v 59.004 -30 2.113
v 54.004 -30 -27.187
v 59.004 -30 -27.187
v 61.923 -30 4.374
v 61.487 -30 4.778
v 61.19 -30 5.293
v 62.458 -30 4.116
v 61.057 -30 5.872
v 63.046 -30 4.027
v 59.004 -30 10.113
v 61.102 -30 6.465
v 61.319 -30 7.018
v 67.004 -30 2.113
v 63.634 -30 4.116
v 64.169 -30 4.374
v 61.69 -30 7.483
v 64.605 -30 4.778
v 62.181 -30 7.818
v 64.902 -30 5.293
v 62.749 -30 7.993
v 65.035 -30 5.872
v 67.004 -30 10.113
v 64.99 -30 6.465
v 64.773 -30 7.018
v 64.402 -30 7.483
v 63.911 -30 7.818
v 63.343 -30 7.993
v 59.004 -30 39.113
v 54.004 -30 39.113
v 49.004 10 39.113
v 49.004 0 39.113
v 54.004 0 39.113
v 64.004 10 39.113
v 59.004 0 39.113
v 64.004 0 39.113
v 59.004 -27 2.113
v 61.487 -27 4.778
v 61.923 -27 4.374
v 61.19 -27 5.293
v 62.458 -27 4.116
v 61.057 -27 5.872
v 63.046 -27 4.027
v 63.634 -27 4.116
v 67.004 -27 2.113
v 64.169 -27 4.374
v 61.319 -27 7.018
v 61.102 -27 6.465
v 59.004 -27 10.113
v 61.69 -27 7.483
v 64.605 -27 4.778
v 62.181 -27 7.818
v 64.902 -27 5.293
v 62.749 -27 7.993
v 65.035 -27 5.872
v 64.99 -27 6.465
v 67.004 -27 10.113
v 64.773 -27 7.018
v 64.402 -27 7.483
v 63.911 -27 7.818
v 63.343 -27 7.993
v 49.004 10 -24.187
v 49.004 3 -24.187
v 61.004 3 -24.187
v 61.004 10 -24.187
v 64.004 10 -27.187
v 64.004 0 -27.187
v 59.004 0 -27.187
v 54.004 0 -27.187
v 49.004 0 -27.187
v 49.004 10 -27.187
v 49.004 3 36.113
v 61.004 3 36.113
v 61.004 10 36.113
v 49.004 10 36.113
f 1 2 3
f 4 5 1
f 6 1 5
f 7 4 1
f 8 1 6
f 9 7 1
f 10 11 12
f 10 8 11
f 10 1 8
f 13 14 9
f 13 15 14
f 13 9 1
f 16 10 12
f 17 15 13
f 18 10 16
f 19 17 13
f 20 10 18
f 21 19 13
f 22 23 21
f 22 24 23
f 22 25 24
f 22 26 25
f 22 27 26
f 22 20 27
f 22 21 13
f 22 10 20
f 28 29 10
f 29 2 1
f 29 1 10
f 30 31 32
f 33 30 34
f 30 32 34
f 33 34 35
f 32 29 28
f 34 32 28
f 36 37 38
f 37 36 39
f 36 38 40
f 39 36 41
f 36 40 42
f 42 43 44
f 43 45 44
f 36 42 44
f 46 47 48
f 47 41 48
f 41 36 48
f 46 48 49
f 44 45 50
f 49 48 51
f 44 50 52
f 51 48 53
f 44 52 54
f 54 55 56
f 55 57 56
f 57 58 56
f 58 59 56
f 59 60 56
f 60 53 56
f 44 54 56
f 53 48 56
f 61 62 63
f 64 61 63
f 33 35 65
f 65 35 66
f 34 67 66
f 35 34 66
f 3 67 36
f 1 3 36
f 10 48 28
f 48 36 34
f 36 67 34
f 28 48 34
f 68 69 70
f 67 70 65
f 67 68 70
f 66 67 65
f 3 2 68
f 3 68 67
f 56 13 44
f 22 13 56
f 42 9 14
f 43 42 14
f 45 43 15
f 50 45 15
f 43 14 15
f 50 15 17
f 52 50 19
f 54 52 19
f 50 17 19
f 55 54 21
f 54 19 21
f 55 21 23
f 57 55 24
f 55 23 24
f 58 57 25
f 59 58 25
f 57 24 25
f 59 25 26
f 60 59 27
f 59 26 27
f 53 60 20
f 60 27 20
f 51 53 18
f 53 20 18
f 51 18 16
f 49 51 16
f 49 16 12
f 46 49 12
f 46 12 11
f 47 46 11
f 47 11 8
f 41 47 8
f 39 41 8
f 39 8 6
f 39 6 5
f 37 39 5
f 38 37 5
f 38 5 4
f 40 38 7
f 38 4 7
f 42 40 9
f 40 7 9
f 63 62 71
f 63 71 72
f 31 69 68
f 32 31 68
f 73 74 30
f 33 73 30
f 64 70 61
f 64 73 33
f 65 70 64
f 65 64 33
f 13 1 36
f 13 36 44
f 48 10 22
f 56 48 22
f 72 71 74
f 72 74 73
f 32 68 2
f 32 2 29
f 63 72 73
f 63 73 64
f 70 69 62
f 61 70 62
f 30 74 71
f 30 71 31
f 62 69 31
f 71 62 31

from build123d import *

# Parameters (mm, degrees)
SKETCH1_W               = 177
SKETCH1_H               = 66.3
BOSS_EXTRUDE1_DEPTH     = 10
CUT_EXTRUDE1_DEPTH      = 120.991628317
CUT_EXTRUDE1_DEPTH_BACK = 7
SKETCH2_W               = 171
SKETCH2_H               = 60.3
SKETCH3_W               = 5
SKETCH3_H               = 66.3
BOSS_EXTRUDE2_DEPTH     = 30
SKETCH4_W               = 147
SKETCH4_H               = 66.3
CUT_EXTRUDE2_DEPTH      = 30
SKETCH5_W               = 8
SKETCH5_H               = 8
SKETCH5_R               = 1.899919422
SKETCH5_R_2             = 1.99416254
BOSS_EXTRUDE3_DEPTH     = 3
SKETCH6_W               = 53.200668984
SKETCH6_H               = 118.475248661
CUT_EXTRUDE3_DEPTH      = 137.93353889


with BuildPart() as part:
    # Sketch1 → Boss-Extrude1 (new body)
    with BuildSketch(Plane(origin=(0, 0, 0), x_dir=(1, 0, 0), z_dir=(0, 1, 0))):
        with Locations((-24.496138181, -5.963471112)):
            Rectangle(SKETCH1_W, SKETCH1_H)
    extrude(amount=BOSS_EXTRUDE1_DEPTH)

    # Sketch2 → Cut-Extrude1 (cut, two sides: drawn at the far end of the back side and taken through both)
    with BuildSketch(Plane(origin=(0, 10, 0), x_dir=(1, 0, 0), z_dir=(0, 1, 0)).offset(-CUT_EXTRUDE1_DEPTH_BACK)):
        with Locations((-24.496138181, -5.963471112)):
            Rectangle(SKETCH2_W, SKETCH2_H)
    extrude(amount=CUT_EXTRUDE1_DEPTH + CUT_EXTRUDE1_DEPTH_BACK, mode=Mode.SUBTRACT)

    # Sketch3 → Boss-Extrude2 (add)
    with BuildSketch(Plane.XZ):
        with Locations((-105.496138181, 5.963471112)):
            Rectangle(SKETCH3_W, SKETCH3_H)
        with Locations((56.503861819, 5.963471112)):
            Rectangle(SKETCH3_W, SKETCH3_H)
    extrude(amount=BOSS_EXTRUDE2_DEPTH)

    # Sketch4 → Cut-Extrude2 (cut)
    with BuildSketch(Plane.XZ):
        with Locations((-24.496138181, 5.963471112)):
            Rectangle(SKETCH4_W, SKETCH4_H)
    extrude(amount=-CUT_EXTRUDE2_DEPTH, mode=Mode.SUBTRACT)


with BuildPart() as cut_extrude2_piece_1:
    # of the separate pieces the step leaves, piece 1, a body of its own (cut_extrude2_pieces)
    add(part.part.solids().sort_by_distance((-97.996138181, 0, 39.113471112))[0])



with BuildPart() as cut_extrude2_piece_2:
    # of the separate pieces the step leaves, piece 2, a body of its own (cut_extrude2_pieces)
    add(part.part.solids().sort_by_distance((64.003861819, 0, 39.113471112))[0])


with BuildPart() as cut_extrude2_piece_1_1:
    add(cut_extrude2_piece_1.part)

    add(cut_extrude2_piece_2.part)  # Boss-Extrude3 merges Cut-Extrude2 piece 2
    # Sketch5 → Boss-Extrude3 (add)
    # profile 1 of 2: a face of its own
    with BuildSketch(Plane.XZ.offset(30)):
        with Locations((-111.996138181, 6.113471112)):
            Rectangle(SKETCH5_W, SKETCH5_H)
        with Locations(Location((-111.976969615, 5.996435965, 0), (0, 0, 270))):
            Circle(SKETCH5_R, mode=Mode.SUBTRACT)
    # profile 2 of 2: a face of its own
    with BuildSketch(Plane.XZ.offset(30)):
        with Locations((63.003861819, 6.113471112)):
            Rectangle(SKETCH5_W, SKETCH5_H)
        with Locations(Location((63.046032676, 6.021165831, 0), (0, 0, 270))):
            Circle(SKETCH5_R_2, mode=Mode.SUBTRACT)
    extrude(amount=-BOSS_EXTRUDE3_DEPTH)

    # Sketch6 → Cut-Extrude3 (cut, through all)
    with BuildSketch(Plane(origin=(0, 0, -27.186528888), x_dir=(-1, 0, 0), z_dir=(0, 0, -1))):
        with Locations((95.157985418, 15.958745635)):
            Rectangle(SKETCH6_W, SKETCH6_H)
    extrude(amount=-CUT_EXTRUDE3_DEPTH, mode=Mode.SUBTRACT)


solid = cut_extrude2_piece_1_1.part
